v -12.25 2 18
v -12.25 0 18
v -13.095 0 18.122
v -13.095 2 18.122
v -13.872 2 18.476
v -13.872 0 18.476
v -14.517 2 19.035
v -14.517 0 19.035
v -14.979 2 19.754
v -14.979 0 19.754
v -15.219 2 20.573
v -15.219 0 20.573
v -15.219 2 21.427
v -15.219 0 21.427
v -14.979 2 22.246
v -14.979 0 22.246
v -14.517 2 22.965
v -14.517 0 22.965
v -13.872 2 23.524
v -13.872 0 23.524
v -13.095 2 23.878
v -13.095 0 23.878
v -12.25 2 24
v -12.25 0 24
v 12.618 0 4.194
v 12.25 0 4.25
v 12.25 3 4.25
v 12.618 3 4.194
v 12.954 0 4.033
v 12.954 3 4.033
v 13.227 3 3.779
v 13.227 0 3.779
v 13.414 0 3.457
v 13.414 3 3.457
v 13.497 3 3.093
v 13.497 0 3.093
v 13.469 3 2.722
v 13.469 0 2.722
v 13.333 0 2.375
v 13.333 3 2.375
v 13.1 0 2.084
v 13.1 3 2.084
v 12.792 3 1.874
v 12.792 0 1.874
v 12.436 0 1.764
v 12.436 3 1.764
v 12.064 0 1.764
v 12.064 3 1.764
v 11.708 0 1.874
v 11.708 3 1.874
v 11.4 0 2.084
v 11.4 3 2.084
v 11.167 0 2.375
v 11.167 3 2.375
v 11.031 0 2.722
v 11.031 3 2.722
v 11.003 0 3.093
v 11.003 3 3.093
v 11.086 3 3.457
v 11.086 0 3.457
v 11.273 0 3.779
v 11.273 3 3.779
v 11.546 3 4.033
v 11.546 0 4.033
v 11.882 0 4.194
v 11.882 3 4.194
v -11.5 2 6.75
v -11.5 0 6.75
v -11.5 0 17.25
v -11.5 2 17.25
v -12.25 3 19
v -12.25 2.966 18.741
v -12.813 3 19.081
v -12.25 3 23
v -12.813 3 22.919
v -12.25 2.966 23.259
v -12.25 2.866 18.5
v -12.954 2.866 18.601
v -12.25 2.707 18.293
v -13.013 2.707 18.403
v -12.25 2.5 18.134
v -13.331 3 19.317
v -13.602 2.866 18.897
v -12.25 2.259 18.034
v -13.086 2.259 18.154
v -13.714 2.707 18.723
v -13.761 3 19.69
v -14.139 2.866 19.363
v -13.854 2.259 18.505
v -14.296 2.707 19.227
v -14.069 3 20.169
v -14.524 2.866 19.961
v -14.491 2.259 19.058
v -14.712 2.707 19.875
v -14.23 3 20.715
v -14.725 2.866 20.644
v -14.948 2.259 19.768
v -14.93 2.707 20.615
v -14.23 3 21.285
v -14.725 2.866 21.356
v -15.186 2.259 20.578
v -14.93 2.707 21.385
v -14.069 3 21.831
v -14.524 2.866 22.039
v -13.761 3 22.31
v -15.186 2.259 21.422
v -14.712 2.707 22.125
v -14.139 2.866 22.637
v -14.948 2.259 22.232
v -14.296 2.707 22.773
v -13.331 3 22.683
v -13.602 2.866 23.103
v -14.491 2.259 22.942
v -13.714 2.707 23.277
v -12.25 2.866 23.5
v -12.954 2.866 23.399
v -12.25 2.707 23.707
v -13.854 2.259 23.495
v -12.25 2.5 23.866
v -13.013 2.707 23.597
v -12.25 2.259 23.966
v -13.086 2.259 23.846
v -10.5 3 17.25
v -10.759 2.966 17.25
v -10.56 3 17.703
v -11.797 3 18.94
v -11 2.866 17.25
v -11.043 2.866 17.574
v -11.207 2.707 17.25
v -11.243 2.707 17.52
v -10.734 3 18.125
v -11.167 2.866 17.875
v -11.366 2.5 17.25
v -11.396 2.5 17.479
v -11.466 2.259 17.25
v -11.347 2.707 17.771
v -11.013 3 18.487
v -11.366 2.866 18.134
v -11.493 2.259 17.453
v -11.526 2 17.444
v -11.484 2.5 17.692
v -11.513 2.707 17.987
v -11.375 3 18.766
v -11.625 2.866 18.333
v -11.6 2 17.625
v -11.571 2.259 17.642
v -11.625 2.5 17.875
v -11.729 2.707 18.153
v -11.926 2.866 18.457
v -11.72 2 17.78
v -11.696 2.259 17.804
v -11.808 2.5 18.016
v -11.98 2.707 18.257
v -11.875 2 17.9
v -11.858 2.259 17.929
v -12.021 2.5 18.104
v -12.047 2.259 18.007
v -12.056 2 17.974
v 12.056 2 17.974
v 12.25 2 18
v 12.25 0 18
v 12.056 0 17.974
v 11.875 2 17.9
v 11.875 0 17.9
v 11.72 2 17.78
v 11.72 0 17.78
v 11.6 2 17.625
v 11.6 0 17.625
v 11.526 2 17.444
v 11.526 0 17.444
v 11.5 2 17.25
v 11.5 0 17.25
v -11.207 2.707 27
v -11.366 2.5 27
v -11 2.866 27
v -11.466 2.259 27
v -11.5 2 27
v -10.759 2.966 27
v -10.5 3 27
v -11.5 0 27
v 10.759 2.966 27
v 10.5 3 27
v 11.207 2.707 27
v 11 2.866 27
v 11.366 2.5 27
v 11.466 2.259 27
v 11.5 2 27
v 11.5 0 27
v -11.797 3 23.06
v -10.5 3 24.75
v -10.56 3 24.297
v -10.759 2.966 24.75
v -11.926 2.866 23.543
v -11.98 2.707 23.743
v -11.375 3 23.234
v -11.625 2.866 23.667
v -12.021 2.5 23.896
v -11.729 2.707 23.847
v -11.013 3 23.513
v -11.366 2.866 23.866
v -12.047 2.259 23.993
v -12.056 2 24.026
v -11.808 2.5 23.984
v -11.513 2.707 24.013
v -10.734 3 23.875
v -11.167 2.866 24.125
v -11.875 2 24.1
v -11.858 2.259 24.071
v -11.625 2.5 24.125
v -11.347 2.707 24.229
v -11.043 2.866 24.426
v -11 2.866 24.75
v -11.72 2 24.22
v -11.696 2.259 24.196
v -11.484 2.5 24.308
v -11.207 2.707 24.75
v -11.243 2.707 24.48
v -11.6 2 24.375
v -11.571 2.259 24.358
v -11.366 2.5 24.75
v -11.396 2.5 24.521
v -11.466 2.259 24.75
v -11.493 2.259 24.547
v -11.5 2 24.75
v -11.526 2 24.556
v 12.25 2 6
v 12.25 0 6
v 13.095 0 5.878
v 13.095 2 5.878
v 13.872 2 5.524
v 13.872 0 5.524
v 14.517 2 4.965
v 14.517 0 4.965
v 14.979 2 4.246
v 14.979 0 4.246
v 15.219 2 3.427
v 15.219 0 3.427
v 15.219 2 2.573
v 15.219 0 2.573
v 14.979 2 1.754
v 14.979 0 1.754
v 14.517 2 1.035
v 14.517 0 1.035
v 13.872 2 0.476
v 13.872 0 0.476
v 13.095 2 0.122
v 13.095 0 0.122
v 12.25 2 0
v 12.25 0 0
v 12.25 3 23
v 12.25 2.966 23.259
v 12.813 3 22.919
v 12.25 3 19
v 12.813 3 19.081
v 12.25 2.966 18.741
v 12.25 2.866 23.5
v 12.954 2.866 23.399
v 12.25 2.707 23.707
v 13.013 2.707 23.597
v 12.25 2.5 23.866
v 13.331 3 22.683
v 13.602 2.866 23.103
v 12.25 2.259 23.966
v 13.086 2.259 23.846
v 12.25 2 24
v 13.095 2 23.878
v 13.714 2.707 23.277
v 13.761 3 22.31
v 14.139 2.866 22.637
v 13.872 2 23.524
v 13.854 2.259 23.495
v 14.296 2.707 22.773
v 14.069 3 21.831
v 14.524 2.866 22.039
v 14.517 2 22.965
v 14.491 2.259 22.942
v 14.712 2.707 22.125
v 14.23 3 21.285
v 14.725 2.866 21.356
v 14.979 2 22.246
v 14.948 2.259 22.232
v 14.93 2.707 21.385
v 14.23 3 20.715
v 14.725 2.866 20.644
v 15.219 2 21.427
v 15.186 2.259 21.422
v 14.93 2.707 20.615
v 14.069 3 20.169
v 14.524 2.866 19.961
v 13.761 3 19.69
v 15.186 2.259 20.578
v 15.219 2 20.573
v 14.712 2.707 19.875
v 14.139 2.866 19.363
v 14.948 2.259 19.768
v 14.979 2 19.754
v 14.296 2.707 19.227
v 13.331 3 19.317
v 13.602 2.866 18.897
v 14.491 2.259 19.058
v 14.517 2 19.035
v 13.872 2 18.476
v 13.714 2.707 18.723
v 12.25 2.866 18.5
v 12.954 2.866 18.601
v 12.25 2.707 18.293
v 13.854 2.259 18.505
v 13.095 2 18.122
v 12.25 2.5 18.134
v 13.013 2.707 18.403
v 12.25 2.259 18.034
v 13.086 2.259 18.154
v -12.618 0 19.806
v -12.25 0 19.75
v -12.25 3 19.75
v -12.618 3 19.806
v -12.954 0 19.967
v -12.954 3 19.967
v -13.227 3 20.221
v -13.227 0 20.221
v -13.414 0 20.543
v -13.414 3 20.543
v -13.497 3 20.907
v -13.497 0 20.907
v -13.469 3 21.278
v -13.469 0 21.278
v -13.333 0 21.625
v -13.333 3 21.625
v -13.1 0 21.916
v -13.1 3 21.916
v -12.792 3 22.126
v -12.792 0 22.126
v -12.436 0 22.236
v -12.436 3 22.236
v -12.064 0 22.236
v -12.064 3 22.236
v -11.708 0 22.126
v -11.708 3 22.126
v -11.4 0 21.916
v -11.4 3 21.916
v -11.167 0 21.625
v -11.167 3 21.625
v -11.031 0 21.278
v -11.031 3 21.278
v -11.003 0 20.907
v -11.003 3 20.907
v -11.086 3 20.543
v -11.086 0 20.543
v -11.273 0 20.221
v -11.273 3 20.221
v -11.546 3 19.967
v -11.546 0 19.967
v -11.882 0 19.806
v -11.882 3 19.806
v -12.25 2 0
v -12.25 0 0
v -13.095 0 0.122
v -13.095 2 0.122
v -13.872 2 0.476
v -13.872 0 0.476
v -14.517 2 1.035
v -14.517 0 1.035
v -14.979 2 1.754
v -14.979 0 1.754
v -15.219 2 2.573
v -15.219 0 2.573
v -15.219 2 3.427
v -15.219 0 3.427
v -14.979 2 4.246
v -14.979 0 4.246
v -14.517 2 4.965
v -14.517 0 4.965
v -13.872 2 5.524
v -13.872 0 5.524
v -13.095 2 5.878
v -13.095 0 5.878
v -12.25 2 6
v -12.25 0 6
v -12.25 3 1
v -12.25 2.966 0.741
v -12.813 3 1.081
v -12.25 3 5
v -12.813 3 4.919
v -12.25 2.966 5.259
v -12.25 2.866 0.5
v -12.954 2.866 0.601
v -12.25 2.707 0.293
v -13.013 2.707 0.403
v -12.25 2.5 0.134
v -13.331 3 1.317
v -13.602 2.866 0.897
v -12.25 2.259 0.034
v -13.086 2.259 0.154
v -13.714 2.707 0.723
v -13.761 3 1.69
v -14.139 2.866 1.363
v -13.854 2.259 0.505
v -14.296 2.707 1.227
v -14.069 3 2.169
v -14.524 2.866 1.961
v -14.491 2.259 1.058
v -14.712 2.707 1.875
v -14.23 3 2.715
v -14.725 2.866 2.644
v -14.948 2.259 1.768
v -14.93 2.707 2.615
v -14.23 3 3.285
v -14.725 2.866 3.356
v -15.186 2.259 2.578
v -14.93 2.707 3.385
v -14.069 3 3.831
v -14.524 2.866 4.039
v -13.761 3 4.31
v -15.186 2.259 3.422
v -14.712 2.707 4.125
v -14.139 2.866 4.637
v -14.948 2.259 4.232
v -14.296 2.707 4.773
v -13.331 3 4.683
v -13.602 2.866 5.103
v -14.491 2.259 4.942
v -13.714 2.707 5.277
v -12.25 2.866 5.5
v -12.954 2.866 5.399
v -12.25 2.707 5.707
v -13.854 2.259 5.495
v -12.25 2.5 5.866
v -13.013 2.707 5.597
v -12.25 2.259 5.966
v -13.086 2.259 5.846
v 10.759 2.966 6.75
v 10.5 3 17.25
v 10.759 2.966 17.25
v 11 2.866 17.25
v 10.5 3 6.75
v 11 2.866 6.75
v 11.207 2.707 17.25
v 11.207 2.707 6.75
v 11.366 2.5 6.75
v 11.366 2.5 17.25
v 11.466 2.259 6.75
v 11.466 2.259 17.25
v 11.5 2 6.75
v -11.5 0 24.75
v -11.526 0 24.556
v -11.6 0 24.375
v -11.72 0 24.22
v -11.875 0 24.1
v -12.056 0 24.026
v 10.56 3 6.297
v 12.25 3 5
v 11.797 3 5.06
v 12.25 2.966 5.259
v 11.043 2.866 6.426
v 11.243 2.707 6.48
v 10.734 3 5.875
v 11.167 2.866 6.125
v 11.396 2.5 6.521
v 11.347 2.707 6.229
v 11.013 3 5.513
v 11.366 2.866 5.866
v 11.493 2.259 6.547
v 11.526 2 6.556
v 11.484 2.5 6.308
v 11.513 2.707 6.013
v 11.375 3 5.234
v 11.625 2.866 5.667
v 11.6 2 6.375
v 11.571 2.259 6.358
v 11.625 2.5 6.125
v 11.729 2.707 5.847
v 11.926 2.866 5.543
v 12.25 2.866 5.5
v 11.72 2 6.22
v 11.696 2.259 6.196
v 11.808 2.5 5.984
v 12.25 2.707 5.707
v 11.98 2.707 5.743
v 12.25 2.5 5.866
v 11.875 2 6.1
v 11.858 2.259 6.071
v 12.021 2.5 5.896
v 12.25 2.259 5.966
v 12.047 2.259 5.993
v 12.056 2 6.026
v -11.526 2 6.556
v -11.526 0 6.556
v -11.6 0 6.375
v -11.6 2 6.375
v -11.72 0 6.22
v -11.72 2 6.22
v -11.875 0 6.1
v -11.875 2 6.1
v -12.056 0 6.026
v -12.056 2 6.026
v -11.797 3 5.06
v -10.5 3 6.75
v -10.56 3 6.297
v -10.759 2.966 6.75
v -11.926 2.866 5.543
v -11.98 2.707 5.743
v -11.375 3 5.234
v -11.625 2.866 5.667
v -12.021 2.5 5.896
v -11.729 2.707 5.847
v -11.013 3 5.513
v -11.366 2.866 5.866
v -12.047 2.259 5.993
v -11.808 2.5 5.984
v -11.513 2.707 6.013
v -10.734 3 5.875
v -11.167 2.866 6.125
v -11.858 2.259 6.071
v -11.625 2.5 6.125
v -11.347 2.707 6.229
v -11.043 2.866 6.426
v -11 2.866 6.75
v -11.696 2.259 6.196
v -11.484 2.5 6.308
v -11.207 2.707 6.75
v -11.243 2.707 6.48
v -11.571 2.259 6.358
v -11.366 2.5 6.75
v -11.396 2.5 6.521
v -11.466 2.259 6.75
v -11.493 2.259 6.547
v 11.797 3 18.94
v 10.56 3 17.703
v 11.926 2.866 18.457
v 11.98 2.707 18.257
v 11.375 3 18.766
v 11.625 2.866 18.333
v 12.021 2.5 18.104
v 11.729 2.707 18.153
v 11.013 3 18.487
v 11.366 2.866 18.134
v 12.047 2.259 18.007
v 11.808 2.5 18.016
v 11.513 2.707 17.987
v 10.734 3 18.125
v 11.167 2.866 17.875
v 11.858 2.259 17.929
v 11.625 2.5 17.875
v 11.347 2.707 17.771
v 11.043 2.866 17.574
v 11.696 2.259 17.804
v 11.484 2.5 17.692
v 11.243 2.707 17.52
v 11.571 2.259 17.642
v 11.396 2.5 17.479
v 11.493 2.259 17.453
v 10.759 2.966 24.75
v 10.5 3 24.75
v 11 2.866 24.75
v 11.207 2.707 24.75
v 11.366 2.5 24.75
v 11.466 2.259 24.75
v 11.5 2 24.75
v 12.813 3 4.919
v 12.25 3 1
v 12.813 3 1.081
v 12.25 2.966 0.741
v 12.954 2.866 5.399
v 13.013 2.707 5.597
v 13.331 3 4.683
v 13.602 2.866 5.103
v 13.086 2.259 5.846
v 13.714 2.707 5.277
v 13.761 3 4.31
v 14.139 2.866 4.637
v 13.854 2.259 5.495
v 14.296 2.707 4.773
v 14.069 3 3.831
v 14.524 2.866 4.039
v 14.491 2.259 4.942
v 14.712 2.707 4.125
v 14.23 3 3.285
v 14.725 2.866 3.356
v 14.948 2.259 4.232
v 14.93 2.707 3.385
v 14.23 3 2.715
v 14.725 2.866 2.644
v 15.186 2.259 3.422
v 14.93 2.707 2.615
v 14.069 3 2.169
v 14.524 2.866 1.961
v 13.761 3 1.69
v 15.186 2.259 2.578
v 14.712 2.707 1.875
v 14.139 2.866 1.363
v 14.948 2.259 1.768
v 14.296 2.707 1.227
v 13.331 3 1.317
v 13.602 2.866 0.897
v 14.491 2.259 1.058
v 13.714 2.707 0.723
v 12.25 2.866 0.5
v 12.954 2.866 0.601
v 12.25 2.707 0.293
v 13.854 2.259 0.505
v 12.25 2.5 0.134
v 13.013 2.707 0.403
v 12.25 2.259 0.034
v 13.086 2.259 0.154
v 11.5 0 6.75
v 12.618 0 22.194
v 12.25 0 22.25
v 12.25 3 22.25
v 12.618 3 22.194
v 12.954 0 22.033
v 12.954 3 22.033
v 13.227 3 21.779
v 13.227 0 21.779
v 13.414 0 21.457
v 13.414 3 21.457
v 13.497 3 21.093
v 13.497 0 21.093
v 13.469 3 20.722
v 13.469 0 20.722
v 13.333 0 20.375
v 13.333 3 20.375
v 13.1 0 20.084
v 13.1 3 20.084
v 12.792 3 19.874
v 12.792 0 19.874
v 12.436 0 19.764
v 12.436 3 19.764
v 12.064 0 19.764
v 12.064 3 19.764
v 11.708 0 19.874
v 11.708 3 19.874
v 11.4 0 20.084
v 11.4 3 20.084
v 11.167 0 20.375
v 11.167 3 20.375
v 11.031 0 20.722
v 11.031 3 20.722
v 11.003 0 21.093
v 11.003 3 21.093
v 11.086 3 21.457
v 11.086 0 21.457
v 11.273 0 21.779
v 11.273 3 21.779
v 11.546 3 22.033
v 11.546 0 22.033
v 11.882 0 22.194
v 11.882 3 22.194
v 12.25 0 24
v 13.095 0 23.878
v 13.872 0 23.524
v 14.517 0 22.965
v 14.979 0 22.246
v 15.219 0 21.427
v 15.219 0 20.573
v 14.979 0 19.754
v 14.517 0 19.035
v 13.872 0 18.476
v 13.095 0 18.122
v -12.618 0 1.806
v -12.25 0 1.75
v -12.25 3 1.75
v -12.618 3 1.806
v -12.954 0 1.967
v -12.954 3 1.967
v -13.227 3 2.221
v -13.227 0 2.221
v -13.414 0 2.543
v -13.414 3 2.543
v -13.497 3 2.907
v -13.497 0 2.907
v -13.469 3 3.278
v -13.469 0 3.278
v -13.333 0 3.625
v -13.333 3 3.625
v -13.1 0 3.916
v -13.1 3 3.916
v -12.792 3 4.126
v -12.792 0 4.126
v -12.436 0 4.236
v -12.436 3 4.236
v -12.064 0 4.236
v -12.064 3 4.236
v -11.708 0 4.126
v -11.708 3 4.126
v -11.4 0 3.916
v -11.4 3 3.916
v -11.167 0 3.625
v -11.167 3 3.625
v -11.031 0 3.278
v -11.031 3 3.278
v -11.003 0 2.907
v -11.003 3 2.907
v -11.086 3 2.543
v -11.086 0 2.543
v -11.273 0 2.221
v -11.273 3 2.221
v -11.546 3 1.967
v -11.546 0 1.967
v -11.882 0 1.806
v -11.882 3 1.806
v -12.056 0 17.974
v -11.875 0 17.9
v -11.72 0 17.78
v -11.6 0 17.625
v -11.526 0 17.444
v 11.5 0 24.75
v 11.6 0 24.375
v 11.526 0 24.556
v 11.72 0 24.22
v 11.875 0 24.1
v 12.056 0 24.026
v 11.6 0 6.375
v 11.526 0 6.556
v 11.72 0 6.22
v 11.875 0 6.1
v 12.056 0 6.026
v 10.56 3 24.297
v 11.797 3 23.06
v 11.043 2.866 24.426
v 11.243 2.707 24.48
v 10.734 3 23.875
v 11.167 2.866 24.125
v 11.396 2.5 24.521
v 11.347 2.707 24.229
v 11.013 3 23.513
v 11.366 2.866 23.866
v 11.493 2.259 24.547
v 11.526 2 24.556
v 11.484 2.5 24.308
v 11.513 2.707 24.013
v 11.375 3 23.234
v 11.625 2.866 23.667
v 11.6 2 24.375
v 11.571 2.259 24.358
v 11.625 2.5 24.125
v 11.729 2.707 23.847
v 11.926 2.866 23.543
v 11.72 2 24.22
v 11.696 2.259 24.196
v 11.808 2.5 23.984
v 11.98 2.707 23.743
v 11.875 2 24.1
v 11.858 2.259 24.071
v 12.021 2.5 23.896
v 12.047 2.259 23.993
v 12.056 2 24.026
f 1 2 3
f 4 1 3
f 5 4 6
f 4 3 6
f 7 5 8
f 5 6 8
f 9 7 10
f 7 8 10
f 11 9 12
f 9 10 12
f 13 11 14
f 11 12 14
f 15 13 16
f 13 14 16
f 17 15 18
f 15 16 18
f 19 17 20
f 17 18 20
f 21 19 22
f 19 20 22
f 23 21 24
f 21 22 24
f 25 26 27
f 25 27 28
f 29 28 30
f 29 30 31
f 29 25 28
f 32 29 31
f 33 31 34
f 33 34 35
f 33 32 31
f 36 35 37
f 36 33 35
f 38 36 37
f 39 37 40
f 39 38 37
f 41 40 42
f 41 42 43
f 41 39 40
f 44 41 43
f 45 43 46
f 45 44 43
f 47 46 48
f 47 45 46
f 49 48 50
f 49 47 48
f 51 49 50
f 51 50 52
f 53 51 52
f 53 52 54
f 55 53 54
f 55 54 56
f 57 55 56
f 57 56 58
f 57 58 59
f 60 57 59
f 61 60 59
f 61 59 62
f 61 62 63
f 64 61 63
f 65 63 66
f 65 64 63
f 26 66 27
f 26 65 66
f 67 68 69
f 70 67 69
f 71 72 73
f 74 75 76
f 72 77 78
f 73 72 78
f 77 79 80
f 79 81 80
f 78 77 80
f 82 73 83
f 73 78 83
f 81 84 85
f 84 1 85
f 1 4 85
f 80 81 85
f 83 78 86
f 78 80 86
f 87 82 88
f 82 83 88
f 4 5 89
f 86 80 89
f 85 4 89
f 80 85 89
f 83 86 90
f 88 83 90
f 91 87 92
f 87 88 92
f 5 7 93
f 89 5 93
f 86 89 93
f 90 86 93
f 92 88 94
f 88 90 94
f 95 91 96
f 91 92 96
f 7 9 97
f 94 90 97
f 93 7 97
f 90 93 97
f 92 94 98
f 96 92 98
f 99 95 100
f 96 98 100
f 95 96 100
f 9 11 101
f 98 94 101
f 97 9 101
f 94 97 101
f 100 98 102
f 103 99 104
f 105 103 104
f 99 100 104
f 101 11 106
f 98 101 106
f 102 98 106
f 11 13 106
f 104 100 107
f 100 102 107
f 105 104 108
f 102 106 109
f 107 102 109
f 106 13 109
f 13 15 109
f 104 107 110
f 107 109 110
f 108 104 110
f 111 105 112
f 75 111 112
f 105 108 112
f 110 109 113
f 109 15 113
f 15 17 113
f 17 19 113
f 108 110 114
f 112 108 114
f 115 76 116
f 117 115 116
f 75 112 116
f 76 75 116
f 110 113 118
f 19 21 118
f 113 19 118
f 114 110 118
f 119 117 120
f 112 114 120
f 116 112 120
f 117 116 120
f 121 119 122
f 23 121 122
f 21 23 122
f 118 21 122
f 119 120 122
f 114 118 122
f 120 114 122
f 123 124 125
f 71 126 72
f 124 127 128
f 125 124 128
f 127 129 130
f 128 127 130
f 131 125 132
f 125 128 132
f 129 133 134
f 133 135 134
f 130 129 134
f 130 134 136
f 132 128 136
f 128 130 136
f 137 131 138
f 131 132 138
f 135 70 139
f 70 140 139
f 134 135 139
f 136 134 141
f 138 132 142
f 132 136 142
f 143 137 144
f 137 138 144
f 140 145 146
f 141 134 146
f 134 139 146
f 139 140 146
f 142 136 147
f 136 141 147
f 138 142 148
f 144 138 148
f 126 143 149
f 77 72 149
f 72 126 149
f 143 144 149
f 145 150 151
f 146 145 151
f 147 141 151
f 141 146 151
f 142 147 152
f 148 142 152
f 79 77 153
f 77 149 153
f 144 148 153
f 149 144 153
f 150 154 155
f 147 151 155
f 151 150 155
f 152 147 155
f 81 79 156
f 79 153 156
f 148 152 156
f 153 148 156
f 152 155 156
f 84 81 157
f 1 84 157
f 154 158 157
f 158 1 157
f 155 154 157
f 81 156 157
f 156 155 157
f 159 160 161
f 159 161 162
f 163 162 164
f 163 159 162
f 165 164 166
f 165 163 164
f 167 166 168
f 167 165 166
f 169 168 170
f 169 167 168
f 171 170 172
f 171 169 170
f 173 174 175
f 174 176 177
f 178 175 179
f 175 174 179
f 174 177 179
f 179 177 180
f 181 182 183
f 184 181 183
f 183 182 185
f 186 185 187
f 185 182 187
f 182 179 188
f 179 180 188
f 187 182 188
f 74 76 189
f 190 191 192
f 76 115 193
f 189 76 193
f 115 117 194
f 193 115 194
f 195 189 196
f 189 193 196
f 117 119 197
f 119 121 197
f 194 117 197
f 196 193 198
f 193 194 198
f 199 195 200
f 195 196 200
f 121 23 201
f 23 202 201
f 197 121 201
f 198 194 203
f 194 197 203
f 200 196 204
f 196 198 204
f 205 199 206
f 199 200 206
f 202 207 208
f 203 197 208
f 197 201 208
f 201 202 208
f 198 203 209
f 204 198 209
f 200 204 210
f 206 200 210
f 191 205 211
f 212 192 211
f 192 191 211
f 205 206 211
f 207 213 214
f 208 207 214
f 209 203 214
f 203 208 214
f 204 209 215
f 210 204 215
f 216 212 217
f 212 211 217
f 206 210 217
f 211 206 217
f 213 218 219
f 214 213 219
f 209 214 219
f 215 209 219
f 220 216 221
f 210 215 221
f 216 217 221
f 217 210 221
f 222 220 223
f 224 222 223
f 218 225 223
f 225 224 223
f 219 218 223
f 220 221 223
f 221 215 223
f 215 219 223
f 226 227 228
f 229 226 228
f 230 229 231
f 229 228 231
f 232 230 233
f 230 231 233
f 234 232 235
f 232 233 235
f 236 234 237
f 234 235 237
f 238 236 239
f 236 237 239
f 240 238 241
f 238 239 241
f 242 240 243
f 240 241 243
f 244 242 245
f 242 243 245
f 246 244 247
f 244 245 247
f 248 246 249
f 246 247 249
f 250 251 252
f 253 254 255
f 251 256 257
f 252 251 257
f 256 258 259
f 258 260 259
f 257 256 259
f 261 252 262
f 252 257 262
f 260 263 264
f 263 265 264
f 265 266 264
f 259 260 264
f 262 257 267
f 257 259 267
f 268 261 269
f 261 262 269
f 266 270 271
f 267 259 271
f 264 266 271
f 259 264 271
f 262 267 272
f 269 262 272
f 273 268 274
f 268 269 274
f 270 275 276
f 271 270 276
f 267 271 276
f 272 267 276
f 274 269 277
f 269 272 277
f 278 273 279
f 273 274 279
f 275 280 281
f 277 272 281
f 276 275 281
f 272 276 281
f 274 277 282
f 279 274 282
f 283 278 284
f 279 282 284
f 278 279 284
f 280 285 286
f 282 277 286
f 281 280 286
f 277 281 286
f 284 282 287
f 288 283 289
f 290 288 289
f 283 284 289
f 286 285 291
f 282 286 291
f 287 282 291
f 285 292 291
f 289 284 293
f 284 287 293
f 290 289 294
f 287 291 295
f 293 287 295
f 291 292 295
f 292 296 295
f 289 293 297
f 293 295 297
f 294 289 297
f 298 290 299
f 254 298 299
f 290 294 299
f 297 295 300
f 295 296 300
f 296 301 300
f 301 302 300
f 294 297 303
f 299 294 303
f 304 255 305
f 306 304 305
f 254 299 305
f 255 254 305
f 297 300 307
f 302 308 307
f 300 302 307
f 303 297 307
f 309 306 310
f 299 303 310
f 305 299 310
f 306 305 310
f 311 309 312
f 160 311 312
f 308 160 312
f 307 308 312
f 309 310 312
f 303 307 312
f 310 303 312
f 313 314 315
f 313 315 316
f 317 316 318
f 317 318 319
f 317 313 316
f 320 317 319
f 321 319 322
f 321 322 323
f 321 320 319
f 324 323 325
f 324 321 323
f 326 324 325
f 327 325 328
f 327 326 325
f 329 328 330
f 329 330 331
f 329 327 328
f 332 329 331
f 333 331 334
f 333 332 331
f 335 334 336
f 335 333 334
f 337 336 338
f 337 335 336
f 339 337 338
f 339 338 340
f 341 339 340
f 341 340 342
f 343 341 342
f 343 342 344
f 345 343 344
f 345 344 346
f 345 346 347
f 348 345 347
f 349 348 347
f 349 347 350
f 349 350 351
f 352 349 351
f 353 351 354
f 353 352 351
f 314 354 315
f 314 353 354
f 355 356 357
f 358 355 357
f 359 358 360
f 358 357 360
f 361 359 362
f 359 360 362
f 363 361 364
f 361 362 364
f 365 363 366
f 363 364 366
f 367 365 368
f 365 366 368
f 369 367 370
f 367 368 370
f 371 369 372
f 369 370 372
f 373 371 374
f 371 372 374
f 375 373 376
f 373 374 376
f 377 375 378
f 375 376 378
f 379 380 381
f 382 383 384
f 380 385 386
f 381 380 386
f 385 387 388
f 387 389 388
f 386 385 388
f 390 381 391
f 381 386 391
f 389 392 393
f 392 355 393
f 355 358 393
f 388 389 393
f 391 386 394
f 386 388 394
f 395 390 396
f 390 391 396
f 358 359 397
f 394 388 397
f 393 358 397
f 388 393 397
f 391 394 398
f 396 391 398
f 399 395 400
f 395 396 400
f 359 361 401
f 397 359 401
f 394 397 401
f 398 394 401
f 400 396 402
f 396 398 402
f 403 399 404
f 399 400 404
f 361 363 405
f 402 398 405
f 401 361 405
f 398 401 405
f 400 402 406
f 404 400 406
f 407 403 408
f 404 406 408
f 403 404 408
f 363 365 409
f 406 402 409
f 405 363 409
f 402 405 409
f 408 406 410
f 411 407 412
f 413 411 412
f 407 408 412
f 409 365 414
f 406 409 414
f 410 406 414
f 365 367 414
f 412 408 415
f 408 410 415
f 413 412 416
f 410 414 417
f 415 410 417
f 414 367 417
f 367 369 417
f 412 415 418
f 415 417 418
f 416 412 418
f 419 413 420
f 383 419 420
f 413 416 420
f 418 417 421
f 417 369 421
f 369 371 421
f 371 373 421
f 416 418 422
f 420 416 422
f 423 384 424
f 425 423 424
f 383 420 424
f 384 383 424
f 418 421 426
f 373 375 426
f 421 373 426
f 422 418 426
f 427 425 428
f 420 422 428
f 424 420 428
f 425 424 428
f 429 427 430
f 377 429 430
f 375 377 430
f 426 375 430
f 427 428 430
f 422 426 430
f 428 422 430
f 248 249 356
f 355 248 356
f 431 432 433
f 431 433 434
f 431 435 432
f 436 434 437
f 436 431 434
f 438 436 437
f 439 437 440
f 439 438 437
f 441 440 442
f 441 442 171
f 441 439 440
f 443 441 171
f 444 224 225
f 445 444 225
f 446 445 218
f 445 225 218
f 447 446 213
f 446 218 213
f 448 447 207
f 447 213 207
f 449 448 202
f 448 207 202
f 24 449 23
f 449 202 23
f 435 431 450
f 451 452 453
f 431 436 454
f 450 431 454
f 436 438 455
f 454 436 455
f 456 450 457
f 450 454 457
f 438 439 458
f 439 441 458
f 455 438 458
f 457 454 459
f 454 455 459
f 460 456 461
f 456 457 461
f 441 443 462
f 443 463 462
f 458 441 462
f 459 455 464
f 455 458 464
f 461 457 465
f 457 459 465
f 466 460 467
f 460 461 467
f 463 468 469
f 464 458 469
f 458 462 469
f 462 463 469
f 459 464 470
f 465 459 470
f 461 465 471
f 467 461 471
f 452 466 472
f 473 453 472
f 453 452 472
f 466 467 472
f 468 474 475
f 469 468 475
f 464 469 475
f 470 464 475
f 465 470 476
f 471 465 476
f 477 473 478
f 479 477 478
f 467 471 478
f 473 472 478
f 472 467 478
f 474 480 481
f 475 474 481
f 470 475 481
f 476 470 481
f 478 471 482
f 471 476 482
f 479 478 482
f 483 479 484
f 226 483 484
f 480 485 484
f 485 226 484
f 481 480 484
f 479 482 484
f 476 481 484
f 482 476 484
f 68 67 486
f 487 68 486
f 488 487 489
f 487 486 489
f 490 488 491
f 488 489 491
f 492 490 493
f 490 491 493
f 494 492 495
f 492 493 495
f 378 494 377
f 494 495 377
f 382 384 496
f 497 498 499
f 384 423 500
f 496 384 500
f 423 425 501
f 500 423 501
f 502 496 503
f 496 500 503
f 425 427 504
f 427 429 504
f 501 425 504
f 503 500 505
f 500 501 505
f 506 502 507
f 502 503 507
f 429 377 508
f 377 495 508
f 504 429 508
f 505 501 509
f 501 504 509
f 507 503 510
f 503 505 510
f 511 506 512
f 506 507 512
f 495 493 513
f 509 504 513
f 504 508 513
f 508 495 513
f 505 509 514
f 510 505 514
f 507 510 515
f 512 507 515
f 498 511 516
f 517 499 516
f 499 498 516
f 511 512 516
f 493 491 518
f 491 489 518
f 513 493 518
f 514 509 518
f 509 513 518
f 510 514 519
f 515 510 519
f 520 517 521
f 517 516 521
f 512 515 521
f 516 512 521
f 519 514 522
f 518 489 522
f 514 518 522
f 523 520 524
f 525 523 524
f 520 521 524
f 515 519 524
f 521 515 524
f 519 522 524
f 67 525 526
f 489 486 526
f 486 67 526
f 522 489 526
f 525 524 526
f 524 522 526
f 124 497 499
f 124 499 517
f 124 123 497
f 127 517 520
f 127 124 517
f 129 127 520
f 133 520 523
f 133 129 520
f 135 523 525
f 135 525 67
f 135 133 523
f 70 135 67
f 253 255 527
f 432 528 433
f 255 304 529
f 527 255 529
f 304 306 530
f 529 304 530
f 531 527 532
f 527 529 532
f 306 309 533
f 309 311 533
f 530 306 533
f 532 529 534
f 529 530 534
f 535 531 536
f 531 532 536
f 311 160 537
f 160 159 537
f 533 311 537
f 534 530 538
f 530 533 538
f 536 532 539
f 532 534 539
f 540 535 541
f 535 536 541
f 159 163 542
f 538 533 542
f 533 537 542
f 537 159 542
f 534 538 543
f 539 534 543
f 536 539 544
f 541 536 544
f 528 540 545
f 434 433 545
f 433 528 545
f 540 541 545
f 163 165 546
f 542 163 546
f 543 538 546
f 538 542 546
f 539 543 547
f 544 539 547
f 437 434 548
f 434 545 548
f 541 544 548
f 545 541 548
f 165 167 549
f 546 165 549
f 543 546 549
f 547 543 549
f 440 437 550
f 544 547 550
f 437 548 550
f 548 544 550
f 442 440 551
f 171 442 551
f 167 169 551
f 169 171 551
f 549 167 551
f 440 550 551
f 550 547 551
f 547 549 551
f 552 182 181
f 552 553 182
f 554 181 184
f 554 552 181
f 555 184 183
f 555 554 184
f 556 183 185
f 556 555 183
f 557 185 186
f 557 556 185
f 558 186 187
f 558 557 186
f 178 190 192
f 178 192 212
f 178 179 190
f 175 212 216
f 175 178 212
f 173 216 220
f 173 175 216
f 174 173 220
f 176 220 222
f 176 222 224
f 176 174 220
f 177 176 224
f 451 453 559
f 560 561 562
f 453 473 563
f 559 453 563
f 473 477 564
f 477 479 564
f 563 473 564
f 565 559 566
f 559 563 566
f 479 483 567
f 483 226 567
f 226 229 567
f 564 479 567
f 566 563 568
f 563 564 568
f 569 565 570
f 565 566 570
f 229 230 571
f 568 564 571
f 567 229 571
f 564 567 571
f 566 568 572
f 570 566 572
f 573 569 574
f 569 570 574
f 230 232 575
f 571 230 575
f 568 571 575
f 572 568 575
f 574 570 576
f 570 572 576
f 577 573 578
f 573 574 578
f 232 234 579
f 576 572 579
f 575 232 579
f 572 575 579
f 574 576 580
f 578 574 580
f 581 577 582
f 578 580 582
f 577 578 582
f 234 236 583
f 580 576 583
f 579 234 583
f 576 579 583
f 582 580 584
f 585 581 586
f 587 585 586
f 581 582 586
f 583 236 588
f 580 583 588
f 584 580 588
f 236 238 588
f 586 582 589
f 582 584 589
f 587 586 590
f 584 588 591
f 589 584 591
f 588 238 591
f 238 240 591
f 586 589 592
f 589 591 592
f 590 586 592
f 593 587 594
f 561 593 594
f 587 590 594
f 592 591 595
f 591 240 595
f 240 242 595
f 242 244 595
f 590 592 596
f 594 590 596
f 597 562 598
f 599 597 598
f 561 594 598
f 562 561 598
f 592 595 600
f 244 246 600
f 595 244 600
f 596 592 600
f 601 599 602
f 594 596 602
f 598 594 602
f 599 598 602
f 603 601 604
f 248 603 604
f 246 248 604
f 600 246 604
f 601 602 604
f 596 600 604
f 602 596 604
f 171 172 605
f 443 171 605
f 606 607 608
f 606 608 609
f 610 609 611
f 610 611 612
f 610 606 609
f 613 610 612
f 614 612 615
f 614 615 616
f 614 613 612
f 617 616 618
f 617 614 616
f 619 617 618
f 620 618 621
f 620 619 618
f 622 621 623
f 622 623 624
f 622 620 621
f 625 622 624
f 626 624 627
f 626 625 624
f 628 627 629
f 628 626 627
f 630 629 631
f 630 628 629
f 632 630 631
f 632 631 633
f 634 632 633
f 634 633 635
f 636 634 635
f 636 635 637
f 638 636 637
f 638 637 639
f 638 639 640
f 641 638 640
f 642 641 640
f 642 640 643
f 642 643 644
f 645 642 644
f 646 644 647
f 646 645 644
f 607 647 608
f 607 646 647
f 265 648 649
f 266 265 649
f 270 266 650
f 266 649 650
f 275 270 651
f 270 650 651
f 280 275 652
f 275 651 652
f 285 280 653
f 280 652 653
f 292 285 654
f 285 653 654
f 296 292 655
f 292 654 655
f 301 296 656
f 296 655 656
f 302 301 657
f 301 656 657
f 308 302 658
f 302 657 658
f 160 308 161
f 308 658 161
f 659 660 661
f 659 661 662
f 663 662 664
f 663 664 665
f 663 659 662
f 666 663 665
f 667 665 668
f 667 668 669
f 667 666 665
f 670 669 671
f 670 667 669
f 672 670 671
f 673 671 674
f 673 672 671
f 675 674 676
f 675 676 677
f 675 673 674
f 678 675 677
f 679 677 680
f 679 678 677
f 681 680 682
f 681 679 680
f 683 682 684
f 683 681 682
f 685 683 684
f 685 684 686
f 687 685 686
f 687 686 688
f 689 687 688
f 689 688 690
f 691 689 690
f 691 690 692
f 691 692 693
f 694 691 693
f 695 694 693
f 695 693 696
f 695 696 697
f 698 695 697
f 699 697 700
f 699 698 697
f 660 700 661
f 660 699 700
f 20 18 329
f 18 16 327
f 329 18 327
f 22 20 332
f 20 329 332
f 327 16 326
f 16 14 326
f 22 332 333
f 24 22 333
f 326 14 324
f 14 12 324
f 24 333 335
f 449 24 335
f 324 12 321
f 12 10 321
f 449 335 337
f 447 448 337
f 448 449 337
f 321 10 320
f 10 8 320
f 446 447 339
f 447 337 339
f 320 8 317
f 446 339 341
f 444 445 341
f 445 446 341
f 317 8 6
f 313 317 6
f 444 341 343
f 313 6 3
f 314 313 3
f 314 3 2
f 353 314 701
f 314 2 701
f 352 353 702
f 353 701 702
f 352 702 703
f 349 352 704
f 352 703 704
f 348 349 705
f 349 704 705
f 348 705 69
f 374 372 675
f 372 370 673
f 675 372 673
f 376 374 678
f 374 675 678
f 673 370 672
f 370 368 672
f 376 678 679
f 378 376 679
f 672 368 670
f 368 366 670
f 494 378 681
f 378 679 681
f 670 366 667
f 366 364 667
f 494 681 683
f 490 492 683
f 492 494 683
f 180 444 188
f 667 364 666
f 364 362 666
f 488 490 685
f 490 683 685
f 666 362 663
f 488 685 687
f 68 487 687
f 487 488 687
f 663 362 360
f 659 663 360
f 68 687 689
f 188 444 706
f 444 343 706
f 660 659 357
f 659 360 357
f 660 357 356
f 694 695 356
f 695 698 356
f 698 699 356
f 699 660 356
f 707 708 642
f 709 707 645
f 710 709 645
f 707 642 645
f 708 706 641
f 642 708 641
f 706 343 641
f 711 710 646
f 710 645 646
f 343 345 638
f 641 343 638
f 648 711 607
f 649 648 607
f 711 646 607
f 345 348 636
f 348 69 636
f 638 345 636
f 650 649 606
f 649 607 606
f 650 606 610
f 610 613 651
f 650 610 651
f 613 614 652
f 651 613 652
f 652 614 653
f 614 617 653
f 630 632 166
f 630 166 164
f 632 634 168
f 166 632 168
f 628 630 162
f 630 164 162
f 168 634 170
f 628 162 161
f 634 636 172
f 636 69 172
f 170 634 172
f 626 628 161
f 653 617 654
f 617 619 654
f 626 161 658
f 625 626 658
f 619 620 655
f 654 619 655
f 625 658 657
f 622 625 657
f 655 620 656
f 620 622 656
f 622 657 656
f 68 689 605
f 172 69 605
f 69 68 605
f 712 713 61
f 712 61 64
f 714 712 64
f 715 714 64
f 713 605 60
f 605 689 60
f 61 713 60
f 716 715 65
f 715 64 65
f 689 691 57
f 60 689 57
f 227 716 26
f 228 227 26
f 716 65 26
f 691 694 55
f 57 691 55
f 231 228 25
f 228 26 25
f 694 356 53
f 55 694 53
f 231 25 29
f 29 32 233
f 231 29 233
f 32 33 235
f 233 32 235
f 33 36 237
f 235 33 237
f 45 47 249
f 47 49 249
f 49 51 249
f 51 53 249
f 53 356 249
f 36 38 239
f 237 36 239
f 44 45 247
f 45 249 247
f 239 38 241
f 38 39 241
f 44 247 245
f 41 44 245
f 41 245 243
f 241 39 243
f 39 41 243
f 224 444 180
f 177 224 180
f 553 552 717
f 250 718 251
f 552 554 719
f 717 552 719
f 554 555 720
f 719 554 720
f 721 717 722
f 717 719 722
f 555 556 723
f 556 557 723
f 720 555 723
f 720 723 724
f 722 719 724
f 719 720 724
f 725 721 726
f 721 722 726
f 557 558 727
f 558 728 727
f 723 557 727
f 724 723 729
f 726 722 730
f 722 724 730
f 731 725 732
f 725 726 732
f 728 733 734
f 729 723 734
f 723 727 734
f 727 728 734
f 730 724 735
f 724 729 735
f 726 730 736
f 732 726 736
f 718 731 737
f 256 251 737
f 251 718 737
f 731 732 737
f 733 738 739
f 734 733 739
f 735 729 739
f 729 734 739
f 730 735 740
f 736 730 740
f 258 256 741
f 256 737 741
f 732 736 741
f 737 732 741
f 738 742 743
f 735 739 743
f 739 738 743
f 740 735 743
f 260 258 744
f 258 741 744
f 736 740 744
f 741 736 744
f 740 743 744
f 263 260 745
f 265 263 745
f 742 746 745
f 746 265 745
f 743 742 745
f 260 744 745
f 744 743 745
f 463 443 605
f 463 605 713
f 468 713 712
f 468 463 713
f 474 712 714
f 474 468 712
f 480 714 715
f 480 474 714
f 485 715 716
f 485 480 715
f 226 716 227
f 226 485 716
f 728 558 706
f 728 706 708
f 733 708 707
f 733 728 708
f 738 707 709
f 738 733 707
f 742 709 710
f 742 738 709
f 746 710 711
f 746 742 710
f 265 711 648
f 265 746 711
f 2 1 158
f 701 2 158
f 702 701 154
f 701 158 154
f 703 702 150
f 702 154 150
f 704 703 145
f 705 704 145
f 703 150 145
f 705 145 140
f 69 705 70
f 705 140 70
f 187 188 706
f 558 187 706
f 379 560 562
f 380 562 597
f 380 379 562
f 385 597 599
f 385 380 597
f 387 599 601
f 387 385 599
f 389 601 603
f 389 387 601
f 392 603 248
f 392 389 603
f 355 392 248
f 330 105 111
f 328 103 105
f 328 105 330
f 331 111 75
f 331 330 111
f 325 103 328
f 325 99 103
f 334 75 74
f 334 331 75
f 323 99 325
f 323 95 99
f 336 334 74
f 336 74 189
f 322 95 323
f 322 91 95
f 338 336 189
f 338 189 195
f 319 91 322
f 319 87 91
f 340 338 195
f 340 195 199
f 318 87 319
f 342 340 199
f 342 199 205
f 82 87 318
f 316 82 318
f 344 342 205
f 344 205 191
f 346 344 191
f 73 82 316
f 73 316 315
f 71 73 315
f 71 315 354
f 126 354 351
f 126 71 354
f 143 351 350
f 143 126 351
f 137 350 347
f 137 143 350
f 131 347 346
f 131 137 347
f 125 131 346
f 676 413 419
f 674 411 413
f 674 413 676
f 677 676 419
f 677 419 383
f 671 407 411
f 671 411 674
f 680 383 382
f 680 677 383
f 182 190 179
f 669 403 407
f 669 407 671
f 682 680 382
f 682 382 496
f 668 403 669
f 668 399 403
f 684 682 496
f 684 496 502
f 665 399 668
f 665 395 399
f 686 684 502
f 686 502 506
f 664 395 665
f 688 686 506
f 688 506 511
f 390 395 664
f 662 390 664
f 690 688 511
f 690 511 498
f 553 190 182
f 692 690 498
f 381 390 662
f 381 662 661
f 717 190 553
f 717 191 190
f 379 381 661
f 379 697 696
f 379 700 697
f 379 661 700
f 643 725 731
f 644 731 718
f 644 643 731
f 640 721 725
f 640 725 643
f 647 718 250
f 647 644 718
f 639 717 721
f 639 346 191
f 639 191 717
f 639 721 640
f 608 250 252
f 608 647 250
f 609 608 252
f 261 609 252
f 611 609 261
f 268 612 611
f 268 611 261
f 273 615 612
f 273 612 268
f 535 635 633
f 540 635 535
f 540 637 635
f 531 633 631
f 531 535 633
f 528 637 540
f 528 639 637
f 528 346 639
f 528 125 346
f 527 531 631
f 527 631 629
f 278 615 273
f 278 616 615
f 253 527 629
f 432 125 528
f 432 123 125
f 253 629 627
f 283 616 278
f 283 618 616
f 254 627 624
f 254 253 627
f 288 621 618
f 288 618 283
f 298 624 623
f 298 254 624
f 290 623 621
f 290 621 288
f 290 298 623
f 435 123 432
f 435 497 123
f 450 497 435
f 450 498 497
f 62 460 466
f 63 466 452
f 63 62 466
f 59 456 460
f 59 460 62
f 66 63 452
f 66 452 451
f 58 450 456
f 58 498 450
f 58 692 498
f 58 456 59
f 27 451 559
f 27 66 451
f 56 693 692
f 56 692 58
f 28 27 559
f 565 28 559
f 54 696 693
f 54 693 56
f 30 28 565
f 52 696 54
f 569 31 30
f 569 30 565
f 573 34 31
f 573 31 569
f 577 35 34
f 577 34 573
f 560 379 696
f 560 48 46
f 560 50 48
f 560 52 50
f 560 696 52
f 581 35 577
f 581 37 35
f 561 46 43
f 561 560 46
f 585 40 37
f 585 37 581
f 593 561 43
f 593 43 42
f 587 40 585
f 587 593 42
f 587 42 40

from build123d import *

# Parameters (mm, degrees)
SKETCH3_R           = 1.25
BOSS_EXTRUDE1_DEPTH = 3
FILLET1_R           = 0.75
FILLET2_R           = 1


with BuildPart() as part:
    # Sketch3 → Boss-Extrude1 (new body)
    with BuildSketch(Plane(origin=(0, 0, 0), x_dir=(1, 0, 0), z_dir=(0, 1, 0))):
        with BuildLine():
            Line((-11.5, -24), (-11.5, -27))
            Line((-11.5, -27), (11.5, -27))
            Line((11.5, -27), (11.5, -24))
            Line((11.5, -24), (12.25, -24))
            ThreePointArc((12.25, -24), (15.25, -21), (12.25, -18))
            Line((12.25, -18), (11.5, -18))
            Line((11.5, -18), (11.5, -6))
            Line((11.5, -6), (12.25, -6))
            ThreePointArc((12.25, -6), (15.25, -3), (12.25, 0))
            Line((12.25, 0), (-12.25, 0))
            ThreePointArc((-12.25, 0), (-15.25, -3), (-12.25, -6))
            Line((-12.25, -6), (-11.5, -6))
            Line((-11.5, -6), (-11.5, -18))
            Line((-11.5, -18), (-12.25, -18))
            ThreePointArc((-12.25, -18), (-15.25, -21), (-12.25, -24))
            Line((-12.25, -24), (-11.5, -24))
        make_face()
        with Locations(Location((-12.25, -21, 0), (0, 0, 90))):
            Circle(SKETCH3_R, mode=Mode.SUBTRACT)
        with Locations(Location((-12.25, -3, 0), (0, 0, 90))):
            Circle(SKETCH3_R, mode=Mode.SUBTRACT)
        with Locations(Location((12.25, -3, 0), (0, 0, 270))):
            Circle(SKETCH3_R, mode=Mode.SUBTRACT)
        with Locations(Location((12.25, -21, 0), (0, 0, 270))):
            Circle(SKETCH3_R, mode=Mode.SUBTRACT)
    extrude(amount=BOSS_EXTRUDE1_DEPTH)

    # Fillet1
    fillet1_edges = [part.edges().sort_by_distance(p)[0] for p in [
        (-11.5, 1.5, 18),
        (-11.5, 1.5, 24),
        (-11.5, 1.5, 6),
        (11.5, 1.5, 6),
        (11.5, 1.5, 24),
        (11.5, 1.5, 18),
    ]]
    fillet(fillet1_edges, radius=FILLET1_R - 0.0001)  # a hair under: the kernel refuses the full size

    # Fillet2
    fillet2_edges = [part.edges().sort_by_distance(p)[0] for p in [
        (15.25, 3, 21),
        (15.25, 3, 3),
        (0, 3, 0),
        (-15.25, 3, 3),
        (-15.25, 3, 21),
        (-11.5, 3, 12),
        (-11.5, 3, 25.87495),
        (11.5, 3, 12),
        (-11.719640625, 3, 17.780359375),
        (-11.719640625, 3, 24.219640625),
        (-11.719640625, 3, 6.219640625),
        (11.719640625, 3, 6.219640625),
        (11.719640625, 3, 24.219640625),
        (11.719640625, 3, 17.780359375),
        (11.5, 3, 25.87495),
    ]]
    fillet(fillet2_edges, radius=FILLET2_R)


solid = part.part
